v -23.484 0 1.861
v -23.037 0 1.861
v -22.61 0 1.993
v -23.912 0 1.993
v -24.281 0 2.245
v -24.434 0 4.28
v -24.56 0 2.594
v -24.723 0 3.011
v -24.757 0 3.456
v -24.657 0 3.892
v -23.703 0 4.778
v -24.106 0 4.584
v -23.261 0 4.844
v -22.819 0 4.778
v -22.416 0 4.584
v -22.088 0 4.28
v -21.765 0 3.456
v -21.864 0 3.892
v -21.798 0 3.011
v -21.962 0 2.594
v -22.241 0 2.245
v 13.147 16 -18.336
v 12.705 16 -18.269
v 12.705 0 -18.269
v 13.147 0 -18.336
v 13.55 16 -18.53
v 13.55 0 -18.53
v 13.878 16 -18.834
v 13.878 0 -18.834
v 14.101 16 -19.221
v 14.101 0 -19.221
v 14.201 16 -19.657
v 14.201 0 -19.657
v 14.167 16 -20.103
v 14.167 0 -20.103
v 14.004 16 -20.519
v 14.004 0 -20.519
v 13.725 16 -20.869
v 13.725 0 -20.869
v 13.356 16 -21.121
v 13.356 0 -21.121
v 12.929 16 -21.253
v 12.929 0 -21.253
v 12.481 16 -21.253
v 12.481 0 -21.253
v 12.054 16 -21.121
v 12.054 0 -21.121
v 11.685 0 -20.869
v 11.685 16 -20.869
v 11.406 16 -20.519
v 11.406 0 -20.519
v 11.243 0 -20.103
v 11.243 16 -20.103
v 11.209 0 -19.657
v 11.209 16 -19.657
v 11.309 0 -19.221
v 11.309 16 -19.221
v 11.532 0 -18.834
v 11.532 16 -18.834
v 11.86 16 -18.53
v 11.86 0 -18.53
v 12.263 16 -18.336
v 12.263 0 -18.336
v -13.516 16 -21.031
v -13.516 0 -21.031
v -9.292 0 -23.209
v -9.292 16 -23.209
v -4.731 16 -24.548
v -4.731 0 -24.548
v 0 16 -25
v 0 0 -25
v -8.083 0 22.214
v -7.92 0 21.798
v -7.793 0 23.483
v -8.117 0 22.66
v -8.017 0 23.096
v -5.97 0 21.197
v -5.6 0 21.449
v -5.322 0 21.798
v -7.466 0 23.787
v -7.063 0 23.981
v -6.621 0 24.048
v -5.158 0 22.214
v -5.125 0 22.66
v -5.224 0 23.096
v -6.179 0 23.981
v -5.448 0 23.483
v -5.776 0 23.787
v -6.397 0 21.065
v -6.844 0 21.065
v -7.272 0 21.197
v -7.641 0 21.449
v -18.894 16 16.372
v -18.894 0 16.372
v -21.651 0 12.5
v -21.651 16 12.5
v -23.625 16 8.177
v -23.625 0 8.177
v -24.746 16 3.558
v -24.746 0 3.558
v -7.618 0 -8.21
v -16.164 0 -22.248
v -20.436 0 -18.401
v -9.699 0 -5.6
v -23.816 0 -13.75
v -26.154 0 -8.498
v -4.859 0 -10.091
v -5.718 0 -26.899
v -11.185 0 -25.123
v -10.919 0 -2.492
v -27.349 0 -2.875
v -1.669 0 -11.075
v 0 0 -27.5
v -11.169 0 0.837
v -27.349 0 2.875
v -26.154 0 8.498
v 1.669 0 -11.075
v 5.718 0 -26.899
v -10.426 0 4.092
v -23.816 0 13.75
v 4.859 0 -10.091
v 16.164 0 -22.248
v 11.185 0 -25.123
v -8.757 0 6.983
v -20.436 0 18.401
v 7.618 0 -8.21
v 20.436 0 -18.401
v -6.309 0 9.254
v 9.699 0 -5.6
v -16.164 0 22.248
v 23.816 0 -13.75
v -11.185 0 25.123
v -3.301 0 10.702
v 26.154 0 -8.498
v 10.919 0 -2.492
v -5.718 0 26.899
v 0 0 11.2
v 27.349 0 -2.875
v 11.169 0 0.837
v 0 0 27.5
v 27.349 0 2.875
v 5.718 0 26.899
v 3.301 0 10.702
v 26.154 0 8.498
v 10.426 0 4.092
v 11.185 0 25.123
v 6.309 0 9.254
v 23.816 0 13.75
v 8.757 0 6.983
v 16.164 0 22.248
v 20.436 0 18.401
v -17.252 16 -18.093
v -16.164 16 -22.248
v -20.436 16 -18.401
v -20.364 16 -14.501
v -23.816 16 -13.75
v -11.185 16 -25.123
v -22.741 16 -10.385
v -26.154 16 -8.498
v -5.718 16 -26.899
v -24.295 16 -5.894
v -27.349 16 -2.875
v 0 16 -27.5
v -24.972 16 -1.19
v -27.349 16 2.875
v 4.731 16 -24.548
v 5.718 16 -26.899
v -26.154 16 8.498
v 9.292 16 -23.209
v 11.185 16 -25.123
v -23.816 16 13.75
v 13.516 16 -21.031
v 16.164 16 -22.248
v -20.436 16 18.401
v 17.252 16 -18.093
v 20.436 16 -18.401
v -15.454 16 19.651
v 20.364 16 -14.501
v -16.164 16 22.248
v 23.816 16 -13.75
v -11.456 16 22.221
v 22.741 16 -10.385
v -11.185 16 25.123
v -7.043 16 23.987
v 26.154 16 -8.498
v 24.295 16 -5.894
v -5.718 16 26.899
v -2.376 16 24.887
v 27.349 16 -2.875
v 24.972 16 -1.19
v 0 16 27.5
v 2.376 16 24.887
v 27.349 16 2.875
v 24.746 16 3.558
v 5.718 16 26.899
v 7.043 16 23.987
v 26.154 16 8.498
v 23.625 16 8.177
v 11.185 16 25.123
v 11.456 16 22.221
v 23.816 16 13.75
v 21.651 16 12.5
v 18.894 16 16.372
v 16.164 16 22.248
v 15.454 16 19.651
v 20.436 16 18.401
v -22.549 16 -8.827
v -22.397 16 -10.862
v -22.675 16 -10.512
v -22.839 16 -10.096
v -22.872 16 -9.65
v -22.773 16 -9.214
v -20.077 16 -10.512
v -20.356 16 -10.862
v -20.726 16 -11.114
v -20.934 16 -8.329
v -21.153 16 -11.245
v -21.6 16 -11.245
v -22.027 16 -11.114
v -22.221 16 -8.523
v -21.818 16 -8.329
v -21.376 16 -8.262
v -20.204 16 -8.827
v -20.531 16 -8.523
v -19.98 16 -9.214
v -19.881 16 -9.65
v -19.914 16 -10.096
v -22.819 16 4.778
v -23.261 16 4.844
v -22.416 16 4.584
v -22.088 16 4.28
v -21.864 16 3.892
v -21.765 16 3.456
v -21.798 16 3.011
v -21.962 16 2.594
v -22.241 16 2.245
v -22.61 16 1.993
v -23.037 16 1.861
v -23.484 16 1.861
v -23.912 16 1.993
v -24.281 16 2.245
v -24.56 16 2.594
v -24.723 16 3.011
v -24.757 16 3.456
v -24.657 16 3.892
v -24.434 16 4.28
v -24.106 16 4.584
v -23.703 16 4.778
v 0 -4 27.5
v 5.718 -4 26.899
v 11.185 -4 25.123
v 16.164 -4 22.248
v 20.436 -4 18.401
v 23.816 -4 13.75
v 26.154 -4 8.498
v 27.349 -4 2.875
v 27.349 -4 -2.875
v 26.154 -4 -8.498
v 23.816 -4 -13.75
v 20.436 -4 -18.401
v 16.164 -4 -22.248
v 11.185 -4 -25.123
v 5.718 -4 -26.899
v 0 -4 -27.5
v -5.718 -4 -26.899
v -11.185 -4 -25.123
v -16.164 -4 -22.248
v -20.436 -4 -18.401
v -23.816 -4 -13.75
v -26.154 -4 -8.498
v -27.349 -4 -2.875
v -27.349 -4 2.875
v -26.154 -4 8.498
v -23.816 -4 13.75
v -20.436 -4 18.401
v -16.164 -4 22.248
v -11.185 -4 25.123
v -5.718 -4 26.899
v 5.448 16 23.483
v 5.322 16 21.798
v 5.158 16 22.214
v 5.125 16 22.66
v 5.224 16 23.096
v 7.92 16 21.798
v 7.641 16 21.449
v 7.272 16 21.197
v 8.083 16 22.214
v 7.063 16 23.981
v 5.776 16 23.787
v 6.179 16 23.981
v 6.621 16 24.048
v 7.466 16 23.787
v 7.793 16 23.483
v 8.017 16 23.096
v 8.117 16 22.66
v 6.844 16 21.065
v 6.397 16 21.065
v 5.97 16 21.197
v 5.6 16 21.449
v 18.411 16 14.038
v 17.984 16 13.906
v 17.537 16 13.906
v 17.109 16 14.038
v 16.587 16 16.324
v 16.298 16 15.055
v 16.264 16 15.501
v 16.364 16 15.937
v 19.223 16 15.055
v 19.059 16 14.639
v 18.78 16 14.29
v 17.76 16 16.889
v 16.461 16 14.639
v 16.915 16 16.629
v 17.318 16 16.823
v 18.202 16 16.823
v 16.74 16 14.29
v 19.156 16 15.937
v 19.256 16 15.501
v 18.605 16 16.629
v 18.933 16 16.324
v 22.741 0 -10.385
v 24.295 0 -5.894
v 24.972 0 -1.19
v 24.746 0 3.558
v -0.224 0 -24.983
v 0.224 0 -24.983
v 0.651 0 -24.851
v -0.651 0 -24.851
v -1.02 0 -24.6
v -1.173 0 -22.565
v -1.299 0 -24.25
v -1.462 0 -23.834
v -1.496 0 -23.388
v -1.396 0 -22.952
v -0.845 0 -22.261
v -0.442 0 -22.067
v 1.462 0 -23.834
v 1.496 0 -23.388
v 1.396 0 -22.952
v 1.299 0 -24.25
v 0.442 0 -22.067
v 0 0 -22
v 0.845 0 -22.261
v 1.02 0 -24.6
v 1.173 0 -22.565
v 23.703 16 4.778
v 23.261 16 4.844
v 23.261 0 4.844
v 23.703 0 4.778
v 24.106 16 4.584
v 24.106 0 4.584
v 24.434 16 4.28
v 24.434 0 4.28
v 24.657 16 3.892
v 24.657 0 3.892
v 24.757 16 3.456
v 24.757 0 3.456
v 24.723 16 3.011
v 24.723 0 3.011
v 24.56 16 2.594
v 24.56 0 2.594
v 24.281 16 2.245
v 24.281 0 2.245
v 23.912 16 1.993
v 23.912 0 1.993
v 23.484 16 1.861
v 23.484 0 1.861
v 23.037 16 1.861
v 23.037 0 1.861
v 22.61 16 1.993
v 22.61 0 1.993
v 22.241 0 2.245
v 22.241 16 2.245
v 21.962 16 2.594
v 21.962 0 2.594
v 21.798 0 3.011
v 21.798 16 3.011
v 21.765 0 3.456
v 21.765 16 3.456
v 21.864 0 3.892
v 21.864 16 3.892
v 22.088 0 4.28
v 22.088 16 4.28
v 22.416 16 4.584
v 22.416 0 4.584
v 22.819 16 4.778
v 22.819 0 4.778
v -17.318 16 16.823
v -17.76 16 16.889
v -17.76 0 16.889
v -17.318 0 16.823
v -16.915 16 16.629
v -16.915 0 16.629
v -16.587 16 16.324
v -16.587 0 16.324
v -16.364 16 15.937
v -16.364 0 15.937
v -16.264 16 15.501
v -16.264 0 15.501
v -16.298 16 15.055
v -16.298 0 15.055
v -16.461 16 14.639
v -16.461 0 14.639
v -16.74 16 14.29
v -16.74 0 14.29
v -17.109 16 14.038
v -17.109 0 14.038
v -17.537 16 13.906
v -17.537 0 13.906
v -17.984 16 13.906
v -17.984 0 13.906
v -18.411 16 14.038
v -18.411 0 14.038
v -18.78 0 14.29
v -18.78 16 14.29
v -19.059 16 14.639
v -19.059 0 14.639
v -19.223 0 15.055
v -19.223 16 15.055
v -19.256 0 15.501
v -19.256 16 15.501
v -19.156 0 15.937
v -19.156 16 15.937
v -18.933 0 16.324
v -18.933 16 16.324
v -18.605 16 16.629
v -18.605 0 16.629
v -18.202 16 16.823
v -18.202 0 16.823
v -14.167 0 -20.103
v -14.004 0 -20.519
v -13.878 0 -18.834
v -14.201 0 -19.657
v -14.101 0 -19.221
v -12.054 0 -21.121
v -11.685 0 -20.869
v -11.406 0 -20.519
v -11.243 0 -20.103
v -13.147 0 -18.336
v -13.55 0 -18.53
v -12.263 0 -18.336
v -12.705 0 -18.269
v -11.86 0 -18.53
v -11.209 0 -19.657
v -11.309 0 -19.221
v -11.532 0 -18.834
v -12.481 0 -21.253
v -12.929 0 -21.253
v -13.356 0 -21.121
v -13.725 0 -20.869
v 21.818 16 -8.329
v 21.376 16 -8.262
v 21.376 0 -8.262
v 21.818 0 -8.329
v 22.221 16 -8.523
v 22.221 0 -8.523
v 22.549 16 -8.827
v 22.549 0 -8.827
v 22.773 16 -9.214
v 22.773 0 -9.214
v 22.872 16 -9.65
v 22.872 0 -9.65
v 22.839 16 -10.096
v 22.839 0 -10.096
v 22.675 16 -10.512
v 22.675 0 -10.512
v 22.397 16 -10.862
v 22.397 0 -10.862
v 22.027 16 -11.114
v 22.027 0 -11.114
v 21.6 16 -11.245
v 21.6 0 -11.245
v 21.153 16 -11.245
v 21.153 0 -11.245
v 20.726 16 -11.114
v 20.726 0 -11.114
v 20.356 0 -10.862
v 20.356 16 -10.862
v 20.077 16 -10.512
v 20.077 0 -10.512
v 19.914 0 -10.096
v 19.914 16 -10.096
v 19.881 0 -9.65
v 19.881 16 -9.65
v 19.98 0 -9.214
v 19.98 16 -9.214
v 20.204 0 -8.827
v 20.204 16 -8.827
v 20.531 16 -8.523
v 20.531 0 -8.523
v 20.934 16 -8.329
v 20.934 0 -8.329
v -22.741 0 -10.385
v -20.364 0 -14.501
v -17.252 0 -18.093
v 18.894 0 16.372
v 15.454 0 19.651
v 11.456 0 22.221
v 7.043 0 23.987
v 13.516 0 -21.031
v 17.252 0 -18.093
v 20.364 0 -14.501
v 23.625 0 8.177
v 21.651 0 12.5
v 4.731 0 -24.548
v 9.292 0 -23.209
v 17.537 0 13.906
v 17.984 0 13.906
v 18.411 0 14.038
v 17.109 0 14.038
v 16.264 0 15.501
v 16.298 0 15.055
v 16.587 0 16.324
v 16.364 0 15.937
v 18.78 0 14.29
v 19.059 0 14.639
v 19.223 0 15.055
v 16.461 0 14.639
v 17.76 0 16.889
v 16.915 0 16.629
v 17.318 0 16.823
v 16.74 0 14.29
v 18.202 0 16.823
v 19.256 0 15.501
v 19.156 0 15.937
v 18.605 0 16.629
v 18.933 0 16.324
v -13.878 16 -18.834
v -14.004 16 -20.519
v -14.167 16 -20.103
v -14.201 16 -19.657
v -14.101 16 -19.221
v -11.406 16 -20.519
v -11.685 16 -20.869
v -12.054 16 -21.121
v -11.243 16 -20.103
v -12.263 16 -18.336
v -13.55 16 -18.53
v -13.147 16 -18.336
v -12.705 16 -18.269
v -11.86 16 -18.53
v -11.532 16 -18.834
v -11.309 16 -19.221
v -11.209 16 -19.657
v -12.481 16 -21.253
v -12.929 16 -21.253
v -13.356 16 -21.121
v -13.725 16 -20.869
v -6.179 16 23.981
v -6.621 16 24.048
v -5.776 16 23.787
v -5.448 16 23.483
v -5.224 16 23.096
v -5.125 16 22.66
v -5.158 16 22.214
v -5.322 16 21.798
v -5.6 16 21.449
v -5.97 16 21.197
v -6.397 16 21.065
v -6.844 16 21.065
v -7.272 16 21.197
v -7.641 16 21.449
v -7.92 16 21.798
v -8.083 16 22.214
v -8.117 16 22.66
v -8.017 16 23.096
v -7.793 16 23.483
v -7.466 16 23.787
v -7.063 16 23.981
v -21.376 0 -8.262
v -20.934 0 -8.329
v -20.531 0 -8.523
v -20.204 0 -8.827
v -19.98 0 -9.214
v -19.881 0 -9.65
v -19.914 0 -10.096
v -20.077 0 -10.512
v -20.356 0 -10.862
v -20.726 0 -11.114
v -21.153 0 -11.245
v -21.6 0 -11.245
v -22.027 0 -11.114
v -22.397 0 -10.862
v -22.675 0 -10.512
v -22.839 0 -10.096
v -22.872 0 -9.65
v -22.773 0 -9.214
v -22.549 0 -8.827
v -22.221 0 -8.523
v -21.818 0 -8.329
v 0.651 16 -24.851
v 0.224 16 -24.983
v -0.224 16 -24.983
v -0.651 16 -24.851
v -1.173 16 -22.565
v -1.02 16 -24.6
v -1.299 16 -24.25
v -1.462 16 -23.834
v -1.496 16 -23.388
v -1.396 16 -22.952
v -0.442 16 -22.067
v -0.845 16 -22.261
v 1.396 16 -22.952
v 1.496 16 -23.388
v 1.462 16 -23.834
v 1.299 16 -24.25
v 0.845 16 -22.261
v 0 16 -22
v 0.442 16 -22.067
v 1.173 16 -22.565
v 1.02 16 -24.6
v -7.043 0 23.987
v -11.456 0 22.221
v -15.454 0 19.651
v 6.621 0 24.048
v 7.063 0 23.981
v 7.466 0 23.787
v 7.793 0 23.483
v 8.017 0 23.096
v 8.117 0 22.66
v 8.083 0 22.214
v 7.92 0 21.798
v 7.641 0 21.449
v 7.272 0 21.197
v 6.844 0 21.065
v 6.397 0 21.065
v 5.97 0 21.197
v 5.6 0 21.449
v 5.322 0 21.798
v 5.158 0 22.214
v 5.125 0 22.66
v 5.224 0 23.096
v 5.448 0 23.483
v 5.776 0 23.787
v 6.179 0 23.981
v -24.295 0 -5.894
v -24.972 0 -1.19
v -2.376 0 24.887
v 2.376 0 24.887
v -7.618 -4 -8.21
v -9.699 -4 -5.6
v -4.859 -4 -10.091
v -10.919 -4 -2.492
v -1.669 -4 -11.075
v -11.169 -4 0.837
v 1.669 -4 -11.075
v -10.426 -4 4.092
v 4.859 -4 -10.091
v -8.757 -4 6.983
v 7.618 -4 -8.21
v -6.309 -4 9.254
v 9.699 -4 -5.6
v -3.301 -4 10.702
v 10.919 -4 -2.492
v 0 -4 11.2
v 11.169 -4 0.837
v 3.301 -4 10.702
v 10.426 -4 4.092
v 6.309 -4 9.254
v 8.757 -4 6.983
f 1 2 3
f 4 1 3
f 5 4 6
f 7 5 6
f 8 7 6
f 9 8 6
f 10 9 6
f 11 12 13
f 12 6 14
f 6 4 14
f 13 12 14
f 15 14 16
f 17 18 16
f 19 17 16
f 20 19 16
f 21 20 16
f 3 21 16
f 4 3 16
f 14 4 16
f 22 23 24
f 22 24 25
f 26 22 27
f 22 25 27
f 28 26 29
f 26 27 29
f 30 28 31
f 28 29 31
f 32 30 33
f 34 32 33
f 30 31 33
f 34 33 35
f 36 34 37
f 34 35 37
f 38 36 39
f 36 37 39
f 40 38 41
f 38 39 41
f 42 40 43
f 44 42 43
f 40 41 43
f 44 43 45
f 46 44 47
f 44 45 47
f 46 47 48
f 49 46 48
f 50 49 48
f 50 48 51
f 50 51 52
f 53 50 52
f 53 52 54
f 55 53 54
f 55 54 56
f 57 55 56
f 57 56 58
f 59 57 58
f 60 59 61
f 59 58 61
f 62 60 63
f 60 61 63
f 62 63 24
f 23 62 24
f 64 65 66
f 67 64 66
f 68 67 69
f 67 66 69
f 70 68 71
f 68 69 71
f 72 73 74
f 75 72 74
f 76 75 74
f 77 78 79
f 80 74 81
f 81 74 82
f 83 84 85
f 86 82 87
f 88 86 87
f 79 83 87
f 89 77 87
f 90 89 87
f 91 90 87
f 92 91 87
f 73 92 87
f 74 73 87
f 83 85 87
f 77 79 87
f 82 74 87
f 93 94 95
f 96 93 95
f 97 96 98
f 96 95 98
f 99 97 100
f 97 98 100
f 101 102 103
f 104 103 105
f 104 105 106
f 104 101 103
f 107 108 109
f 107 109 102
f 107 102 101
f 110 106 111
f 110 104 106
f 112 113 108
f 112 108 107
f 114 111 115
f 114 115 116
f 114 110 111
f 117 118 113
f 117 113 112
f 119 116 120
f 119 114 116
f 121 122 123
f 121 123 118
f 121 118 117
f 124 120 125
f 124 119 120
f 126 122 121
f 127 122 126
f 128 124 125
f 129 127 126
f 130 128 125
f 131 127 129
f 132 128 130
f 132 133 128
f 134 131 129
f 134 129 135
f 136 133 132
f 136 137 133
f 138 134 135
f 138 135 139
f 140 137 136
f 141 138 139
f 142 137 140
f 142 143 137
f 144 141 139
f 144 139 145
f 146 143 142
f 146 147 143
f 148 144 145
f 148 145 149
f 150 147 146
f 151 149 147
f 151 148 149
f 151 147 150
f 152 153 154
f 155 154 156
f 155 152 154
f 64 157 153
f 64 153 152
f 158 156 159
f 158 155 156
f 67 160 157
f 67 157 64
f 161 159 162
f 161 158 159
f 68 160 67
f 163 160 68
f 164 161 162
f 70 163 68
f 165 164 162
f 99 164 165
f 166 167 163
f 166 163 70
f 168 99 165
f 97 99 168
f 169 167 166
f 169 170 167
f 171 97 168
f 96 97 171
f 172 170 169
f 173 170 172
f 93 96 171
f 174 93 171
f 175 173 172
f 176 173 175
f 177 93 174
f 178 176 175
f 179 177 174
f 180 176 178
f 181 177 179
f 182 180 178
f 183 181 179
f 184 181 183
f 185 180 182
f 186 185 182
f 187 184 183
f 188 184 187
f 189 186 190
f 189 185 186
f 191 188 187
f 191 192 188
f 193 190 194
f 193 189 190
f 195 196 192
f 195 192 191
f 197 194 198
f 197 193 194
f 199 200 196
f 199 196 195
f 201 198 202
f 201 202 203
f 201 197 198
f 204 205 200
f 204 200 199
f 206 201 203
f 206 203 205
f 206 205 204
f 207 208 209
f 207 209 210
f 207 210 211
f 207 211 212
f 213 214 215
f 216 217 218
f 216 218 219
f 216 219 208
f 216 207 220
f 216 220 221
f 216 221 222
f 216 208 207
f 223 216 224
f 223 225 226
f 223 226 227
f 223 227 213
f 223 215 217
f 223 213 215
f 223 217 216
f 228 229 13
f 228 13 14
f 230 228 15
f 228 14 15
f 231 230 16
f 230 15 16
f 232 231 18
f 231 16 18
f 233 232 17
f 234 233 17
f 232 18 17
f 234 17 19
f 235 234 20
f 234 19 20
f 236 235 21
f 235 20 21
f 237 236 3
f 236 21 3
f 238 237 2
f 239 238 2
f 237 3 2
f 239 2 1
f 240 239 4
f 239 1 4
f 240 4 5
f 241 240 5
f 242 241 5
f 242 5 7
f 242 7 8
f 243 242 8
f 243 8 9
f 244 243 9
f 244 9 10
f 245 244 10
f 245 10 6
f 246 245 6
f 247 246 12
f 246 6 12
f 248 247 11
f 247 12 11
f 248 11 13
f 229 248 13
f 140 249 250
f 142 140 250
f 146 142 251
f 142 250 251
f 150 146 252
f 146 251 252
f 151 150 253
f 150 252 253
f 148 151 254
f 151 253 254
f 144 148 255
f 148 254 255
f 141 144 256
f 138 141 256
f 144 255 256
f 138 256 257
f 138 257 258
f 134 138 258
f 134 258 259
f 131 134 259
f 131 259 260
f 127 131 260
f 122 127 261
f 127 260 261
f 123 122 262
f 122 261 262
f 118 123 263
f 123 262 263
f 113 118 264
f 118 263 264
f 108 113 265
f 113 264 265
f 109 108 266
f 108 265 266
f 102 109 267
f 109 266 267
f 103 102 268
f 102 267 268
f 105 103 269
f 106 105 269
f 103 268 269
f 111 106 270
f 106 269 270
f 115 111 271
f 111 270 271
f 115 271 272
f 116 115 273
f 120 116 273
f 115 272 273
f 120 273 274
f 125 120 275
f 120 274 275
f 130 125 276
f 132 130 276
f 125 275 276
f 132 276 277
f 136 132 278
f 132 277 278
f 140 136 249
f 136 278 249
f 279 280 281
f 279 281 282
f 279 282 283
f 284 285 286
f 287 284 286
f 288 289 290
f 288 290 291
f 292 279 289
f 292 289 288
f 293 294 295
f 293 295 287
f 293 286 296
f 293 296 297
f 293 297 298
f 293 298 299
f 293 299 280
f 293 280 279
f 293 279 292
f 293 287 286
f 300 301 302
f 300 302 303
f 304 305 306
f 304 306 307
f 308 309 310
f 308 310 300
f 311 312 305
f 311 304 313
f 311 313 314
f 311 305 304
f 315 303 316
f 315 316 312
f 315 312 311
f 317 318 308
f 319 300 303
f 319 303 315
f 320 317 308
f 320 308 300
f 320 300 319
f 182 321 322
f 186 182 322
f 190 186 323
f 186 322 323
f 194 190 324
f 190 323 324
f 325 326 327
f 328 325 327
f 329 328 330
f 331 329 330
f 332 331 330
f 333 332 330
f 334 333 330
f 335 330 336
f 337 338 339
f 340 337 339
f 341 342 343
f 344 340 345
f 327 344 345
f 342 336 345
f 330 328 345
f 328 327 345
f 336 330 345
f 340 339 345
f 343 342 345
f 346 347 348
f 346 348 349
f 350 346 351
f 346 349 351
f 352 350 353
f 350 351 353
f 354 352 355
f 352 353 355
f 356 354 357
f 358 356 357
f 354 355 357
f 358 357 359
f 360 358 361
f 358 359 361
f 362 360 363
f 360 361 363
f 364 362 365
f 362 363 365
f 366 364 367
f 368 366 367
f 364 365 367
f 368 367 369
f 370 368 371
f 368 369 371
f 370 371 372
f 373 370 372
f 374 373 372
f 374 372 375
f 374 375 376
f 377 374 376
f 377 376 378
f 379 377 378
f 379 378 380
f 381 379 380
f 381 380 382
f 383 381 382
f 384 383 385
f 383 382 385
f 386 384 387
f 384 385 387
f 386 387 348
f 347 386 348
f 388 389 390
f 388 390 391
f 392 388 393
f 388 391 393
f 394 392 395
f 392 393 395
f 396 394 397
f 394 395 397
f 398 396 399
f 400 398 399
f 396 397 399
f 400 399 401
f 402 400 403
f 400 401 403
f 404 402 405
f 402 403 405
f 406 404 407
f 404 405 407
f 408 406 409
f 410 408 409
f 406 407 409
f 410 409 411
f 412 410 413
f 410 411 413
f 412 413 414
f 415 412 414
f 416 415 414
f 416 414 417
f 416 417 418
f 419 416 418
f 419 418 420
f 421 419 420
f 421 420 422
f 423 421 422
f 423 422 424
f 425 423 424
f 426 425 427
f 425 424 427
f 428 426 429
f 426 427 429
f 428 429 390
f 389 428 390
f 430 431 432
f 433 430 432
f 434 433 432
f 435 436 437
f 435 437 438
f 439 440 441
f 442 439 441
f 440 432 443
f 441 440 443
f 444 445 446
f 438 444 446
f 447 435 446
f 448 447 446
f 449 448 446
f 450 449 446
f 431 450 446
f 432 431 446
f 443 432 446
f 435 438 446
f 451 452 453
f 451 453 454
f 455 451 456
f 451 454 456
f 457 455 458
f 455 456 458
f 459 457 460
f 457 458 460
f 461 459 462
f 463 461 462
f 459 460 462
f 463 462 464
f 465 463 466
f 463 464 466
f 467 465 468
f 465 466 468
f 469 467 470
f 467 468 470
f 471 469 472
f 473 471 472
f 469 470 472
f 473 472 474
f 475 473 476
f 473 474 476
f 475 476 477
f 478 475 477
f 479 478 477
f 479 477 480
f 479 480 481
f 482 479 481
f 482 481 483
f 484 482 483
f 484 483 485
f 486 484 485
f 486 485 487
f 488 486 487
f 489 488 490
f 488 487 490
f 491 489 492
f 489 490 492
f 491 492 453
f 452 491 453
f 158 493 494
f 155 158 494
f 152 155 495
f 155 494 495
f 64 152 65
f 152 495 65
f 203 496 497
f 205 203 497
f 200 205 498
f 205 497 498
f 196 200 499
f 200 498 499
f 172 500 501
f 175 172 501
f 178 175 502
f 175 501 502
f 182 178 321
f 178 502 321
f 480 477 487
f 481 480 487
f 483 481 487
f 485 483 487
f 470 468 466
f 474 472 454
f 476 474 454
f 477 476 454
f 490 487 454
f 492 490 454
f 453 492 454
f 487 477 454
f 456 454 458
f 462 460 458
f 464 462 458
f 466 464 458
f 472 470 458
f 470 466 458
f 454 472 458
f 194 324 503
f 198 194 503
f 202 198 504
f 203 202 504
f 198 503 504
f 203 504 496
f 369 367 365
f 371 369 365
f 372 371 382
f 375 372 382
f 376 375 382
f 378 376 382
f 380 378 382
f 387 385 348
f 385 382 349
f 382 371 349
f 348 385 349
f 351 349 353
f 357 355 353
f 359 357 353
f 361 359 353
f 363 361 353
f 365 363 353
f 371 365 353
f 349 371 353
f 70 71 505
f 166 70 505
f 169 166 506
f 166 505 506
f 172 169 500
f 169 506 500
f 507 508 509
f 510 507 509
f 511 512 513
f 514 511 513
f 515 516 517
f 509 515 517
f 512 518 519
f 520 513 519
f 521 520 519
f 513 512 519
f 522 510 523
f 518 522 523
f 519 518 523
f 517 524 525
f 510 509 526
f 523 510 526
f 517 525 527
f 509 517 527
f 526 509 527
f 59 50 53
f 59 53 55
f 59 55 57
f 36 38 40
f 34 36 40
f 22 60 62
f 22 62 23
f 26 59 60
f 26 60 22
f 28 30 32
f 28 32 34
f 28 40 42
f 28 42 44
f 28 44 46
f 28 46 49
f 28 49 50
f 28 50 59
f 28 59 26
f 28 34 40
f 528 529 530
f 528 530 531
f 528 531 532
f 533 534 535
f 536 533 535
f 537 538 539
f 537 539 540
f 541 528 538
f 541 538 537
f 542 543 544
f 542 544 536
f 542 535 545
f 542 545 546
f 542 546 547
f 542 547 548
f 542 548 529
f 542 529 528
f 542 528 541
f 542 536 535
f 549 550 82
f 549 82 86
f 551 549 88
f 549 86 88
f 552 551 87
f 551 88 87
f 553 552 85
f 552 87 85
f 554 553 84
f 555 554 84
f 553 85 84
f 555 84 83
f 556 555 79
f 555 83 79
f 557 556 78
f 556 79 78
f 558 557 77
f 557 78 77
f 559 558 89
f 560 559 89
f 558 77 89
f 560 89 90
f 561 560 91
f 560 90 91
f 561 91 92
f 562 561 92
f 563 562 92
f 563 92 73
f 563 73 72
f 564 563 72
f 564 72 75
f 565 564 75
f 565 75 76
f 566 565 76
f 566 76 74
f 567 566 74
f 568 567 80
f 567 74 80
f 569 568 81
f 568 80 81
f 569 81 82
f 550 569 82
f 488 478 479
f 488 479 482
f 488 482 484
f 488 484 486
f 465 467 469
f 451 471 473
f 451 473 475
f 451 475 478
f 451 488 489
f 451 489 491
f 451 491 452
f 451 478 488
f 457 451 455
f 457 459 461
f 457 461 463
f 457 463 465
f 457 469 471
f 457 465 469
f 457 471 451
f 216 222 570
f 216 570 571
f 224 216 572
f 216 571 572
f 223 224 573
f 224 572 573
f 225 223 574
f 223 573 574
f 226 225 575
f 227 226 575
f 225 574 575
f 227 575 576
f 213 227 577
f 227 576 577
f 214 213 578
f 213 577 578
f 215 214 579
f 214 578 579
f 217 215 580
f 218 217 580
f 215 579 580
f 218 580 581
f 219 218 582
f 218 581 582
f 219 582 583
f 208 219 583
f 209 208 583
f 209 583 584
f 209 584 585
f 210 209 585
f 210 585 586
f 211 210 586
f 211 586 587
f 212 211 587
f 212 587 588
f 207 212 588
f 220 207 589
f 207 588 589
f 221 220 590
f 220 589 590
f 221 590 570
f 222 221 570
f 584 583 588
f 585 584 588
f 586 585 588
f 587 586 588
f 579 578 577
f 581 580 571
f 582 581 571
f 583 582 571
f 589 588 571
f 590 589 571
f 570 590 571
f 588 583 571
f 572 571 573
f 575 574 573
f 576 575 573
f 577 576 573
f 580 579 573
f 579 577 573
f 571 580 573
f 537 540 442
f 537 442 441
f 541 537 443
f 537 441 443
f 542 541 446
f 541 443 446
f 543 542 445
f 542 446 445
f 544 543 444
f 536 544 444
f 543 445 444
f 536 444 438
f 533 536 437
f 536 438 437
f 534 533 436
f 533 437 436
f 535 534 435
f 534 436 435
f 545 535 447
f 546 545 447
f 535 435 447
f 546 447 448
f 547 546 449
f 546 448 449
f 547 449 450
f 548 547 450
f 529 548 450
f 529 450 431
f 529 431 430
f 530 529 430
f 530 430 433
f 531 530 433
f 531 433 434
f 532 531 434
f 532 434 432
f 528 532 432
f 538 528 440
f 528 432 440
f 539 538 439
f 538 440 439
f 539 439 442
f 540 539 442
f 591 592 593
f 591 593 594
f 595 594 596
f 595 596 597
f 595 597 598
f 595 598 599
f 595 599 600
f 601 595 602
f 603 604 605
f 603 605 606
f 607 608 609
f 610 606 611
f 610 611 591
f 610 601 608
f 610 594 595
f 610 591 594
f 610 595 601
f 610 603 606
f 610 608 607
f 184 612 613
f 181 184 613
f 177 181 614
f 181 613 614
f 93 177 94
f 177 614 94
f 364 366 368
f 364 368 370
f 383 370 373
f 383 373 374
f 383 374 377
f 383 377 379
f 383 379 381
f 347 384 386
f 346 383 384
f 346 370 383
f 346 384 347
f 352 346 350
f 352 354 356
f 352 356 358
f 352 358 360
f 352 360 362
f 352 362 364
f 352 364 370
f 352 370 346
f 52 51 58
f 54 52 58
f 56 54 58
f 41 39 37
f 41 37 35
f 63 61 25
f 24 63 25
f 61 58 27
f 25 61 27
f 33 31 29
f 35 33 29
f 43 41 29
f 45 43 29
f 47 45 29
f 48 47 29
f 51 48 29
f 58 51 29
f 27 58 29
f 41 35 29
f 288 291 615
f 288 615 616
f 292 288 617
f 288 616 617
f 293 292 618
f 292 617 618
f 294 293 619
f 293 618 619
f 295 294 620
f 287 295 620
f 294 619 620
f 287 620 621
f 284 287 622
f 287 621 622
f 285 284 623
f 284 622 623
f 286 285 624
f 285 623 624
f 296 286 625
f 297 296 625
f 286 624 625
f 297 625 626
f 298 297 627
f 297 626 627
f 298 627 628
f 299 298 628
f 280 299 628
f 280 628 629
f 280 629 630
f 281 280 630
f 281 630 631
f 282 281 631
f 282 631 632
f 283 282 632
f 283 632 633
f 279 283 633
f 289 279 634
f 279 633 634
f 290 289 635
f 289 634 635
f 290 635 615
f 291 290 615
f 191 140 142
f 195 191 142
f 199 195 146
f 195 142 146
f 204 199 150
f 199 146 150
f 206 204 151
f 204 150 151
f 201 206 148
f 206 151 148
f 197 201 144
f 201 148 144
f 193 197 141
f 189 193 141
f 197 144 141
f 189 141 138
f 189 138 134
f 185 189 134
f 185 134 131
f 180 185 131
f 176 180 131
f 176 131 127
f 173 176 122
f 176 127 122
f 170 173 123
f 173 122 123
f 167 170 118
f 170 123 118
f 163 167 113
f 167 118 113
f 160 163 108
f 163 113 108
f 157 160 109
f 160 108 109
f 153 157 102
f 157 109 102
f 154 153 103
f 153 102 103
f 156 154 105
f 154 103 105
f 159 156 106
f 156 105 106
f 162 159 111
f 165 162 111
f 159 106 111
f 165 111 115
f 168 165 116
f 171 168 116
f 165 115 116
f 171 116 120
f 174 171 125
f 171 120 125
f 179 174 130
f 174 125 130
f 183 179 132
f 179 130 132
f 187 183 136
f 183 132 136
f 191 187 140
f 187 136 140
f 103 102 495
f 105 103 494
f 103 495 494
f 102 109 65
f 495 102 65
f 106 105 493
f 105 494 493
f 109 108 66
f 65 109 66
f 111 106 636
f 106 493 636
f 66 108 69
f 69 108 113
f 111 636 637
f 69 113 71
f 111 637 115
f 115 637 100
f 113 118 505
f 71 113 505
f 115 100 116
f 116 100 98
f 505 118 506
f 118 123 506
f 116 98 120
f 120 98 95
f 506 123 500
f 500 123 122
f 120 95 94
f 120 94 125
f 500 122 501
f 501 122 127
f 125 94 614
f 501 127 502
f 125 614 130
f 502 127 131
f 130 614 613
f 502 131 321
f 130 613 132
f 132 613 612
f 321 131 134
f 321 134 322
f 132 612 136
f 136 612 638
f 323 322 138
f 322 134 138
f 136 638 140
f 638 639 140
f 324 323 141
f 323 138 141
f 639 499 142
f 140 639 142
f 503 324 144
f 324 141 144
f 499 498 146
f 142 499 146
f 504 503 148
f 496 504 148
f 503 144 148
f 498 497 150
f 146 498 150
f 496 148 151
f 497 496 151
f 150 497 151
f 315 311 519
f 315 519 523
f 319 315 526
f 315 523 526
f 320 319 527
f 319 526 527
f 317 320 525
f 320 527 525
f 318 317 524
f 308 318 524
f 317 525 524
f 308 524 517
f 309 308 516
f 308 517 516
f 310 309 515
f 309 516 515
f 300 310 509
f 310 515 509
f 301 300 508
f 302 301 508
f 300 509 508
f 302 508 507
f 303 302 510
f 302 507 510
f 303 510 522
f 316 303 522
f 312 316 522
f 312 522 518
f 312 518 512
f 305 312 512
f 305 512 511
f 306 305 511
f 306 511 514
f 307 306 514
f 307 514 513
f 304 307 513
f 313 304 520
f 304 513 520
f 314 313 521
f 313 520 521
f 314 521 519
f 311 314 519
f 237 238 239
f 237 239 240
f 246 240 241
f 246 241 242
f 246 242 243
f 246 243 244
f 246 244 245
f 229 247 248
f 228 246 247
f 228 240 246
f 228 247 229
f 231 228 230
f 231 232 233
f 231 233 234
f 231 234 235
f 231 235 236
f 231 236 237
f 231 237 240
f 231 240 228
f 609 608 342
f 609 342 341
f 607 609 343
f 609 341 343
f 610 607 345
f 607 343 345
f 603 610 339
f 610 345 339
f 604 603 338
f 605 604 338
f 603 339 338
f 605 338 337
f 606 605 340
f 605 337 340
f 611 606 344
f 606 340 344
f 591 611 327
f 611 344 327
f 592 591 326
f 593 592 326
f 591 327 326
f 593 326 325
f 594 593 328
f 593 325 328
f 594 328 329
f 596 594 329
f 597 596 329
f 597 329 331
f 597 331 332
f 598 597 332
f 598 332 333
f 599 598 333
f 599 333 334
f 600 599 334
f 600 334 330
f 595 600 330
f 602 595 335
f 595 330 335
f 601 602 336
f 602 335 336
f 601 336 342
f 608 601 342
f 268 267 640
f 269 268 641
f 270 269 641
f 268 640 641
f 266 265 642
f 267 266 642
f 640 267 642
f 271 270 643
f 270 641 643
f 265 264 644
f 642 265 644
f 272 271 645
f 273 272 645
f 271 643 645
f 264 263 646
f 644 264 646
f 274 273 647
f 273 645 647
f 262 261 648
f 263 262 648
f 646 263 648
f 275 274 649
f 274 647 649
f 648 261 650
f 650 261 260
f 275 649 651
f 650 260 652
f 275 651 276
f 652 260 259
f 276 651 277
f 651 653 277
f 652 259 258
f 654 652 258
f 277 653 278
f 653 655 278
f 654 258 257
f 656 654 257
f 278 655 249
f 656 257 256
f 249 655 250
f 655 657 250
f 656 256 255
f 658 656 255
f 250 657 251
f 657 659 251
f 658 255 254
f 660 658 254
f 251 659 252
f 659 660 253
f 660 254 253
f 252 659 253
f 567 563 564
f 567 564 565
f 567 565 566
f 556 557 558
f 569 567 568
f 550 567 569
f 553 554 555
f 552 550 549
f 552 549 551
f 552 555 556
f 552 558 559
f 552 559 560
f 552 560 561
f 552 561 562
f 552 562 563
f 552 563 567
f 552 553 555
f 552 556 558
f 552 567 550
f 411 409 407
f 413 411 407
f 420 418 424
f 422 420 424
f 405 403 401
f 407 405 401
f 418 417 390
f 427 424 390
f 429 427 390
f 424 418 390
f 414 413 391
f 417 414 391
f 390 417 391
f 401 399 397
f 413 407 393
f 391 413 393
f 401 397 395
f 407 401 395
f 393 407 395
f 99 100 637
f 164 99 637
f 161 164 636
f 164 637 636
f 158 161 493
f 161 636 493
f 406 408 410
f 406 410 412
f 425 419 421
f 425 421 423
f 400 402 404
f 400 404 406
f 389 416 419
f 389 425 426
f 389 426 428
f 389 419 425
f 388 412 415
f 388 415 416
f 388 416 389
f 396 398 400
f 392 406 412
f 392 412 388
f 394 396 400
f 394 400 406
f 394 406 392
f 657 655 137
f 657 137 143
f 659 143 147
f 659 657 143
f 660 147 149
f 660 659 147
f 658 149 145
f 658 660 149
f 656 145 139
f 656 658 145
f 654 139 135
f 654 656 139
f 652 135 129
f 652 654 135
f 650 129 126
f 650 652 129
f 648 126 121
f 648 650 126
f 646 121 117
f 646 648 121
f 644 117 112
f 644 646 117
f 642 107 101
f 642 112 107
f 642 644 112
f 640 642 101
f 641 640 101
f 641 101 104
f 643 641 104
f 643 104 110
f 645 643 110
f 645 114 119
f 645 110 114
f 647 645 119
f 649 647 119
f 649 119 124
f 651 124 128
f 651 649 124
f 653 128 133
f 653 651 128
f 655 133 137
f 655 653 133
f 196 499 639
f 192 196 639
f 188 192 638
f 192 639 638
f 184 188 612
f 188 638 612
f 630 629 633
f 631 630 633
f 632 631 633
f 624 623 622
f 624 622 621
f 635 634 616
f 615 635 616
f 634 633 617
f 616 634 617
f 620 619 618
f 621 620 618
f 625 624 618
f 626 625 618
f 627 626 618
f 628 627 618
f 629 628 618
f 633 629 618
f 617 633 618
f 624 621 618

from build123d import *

# Parameters (mm, degrees)
SKETCH1_R               = 27.5
BOSS_EXTRUDE1_DEPTH     = 16
SKETCH1_R_2             = 1.5
BOSS_EXTRUDE1_2_DEPTH   = 16
BOSS_EXTRUDE1_3_DEPTH   = 16
BOSS_EXTRUDE1_4_DEPTH   = 16
BOSS_EXTRUDE1_5_DEPTH   = 16
BOSS_EXTRUDE1_6_DEPTH   = 16
BOSS_EXTRUDE1_7_DEPTH   = 16
BOSS_EXTRUDE1_8_DEPTH   = 16
BOSS_EXTRUDE1_9_DEPTH   = 16
BOSS_EXTRUDE1_10_DEPTH  = 16
BOSS_EXTRUDE1_11_DEPTH  = 16
BOSS_EXTRUDE1_12_DEPTH  = 16
BOSS_EXTRUDE2_START     = -4
SKETCH1_3_R             = 27.5
BOSS_EXTRUDE2_DEPTH     = 4
CUT_EXTRUDE1_DEPTH      = 43.053537307
CUT_EXTRUDE1_DEPTH_BACK = 43.053537307
SKETCH1_5_R             = 11.2


with BuildPart() as part:
    # Sketch1 → Boss-Extrude1 (new body)
    with BuildSketch(Plane(origin=(0, 0, 0), x_dir=(1, 0, 0), z_dir=(0, 1, 0))):
        Circle(SKETCH1_R)
        with BuildLine():
            ThreePointArc((-13.516020393, 21.031338349), (-7.0433139, 23.987324347), (-8e-09, 25))
            ThreePointArc((-8e-09, 25), (7.043313305, 23.987324521), (13.516019362, 21.031339011))
            ThreePointArc((13.516019362, 21.031339011), (18.893738404, 16.371519451), (22.740799203, 10.385376816))
            ThreePointArc((22.740799203, 10.385376816), (24.745535808, 3.557872623), (24.745536293, -3.557869248))
            ThreePointArc((24.745536293, -3.557869248), (22.74079993, -10.385375224), (18.893738373, -16.371519486))
            ThreePointArc((18.893738373, -16.371519486), (13.5160198, -21.03133873), (7.043313913, -23.987324343))
            ThreePointArc((7.043313913, -23.987324343), (-1.26e-07, -25), (-7.043314154, -23.987324272))
            ThreePointArc((-7.043314154, -23.987324272), (-13.516020537, -21.031338256), (-18.893739356, -16.371518352))
            ThreePointArc((-18.893739356, -16.371518352), (-22.740799882, -10.38537533), (-24.745536046, -3.557870964))
            ThreePointArc((-24.745536046, -3.557870964), (-24.74553605, 3.557870939), (-22.740799896, 10.385375298))
            ThreePointArc((-22.740799896, 10.385375298), (-18.893739352, 16.371518357), (-13.516020393, 21.031338349))
        make_face(mode=Mode.SUBTRACT)
    extrude(amount=BOSS_EXTRUDE1_DEPTH)


with BuildPart() as body_2:
    # Sketch1 → Boss-Extrude1 2 (new body)
    with BuildSketch(Plane(origin=(0, 0, 0), x_dir=(1, 0, 0), z_dir=(0, 1, 0))):
        with Locations((0, 23.5)):
            Circle(SKETCH1_R_2)
    extrude(amount=BOSS_EXTRUDE1_2_DEPTH)


with BuildPart() as body_3:
    # Sketch1 → Boss-Extrude1 3 (new body)
    with BuildSketch(Plane(origin=(0, 0, 0), x_dir=(1, 0, 0), z_dir=(0, 1, 0))):
        with Locations((-12.70505921, 19.769458022)):
            Circle(SKETCH1_R_2)
    extrude(amount=BOSS_EXTRUDE1_3_DEPTH)


with BuildPart() as body_4:
    # Sketch1 → Boss-Extrude1 4 (new body)
    with BuildSketch(Plane(origin=(0, 0, 0), x_dir=(1, 0, 0), z_dir=(0, 1, 0))):
        with Locations((-21.376351891, 9.762252806)):
            Circle(SKETCH1_R_2)
    extrude(amount=BOSS_EXTRUDE1_4_DEPTH)


with BuildPart() as body_5:
    # Sketch1 → Boss-Extrude1 5 (new body)
    with BuildSketch(Plane(origin=(0, 0, 0), x_dir=(1, 0, 0), z_dir=(0, 1, 0))):
        with Locations((-23.260803884, -3.344398699)):
            Circle(SKETCH1_R_2)
    extrude(amount=BOSS_EXTRUDE1_5_DEPTH)


with BuildPart() as body_6:
    # Sketch1 → Boss-Extrude1 6 (new body)
    with BuildSketch(Plane(origin=(0, 0, 0), x_dir=(1, 0, 0), z_dir=(0, 1, 0))):
        with Locations((-17.760114997, -15.389227248)):
            Circle(SKETCH1_R_2)
    extrude(amount=BOSS_EXTRUDE1_6_DEPTH)


with BuildPart() as body_7:
    # Sketch1 → Boss-Extrude1 7 (new body)
    with BuildSketch(Plane(origin=(0, 0, 0), x_dir=(1, 0, 0), z_dir=(0, 1, 0))):
        with Locations((-6.620715086, -22.54808488)):
            Circle(SKETCH1_R_2)
    extrude(amount=BOSS_EXTRUDE1_7_DEPTH)


with BuildPart() as body_8:
    # Sketch1 → Boss-Extrude1 8 (new body)
    with BuildSketch(Plane(origin=(0, 0, 0), x_dir=(1, 0, 0), z_dir=(0, 1, 0))):
        with Locations((6.620715086, -22.54808488)):
            Circle(SKETCH1_R_2)
    extrude(amount=BOSS_EXTRUDE1_8_DEPTH)


with BuildPart() as body_9:
    # Sketch1 → Boss-Extrude1 9 (new body)
    with BuildSketch(Plane(origin=(0, 0, 0), x_dir=(1, 0, 0), z_dir=(0, 1, 0))):
        with Locations((17.760114997, -15.389227248)):
            Circle(SKETCH1_R_2)
    extrude(amount=BOSS_EXTRUDE1_9_DEPTH)


with BuildPart() as body_10:
    # Sketch1 → Boss-Extrude1 10 (new body)
    with BuildSketch(Plane(origin=(0, 0, 0), x_dir=(1, 0, 0), z_dir=(0, 1, 0))):
        with Locations((23.260803884, -3.344398699)):
            Circle(SKETCH1_R_2)
    extrude(amount=BOSS_EXTRUDE1_10_DEPTH)


with BuildPart() as body_11:
    # Sketch1 → Boss-Extrude1 11 (new body)
    with BuildSketch(Plane(origin=(0, 0, 0), x_dir=(1, 0, 0), z_dir=(0, 1, 0))):
        with Locations((21.376351891, 9.762252806)):
            Circle(SKETCH1_R_2)
    extrude(amount=BOSS_EXTRUDE1_11_DEPTH)


with BuildPart() as body_12:
    # Sketch1 → Boss-Extrude1 12 (new body)
    with BuildSketch(Plane(origin=(0, 0, 0), x_dir=(1, 0, 0), z_dir=(0, 1, 0))):
        with Locations((12.70505921, 19.769458022)):
            Circle(SKETCH1_R_2)
    extrude(amount=BOSS_EXTRUDE1_12_DEPTH)


with BuildPart() as body_13:
    # Sketch1<3> → Boss-Extrude2 (new body)
    with BuildSketch(Plane(origin=(0, 0, 0), x_dir=(1, 0, 0), z_dir=(0, 1, 0)).offset(BOSS_EXTRUDE2_START)):
        Circle(SKETCH1_3_R)
    extrude(amount=BOSS_EXTRUDE2_DEPTH)

    # Sketch1<5> → Cut-Extrude1 (cut, two sides: drawn at the far end of the back side and taken through both)
    with BuildSketch(Plane(origin=(0, 0, 0), x_dir=(1, 0, 0), z_dir=(0, 1, 0)).offset(-CUT_EXTRUDE1_DEPTH_BACK)):
        Circle(SKETCH1_5_R)
    extrude(amount=CUT_EXTRUDE1_DEPTH + CUT_EXTRUDE1_DEPTH_BACK, mode=Mode.SUBTRACT)


solid = Compound([part.part, body_2.part, body_3.part, body_4.part, body_5.part, body_6.part, body_7.part, body_8.part, body_9.part, body_10.part, body_11.part, body_12.part, body_13.part])
